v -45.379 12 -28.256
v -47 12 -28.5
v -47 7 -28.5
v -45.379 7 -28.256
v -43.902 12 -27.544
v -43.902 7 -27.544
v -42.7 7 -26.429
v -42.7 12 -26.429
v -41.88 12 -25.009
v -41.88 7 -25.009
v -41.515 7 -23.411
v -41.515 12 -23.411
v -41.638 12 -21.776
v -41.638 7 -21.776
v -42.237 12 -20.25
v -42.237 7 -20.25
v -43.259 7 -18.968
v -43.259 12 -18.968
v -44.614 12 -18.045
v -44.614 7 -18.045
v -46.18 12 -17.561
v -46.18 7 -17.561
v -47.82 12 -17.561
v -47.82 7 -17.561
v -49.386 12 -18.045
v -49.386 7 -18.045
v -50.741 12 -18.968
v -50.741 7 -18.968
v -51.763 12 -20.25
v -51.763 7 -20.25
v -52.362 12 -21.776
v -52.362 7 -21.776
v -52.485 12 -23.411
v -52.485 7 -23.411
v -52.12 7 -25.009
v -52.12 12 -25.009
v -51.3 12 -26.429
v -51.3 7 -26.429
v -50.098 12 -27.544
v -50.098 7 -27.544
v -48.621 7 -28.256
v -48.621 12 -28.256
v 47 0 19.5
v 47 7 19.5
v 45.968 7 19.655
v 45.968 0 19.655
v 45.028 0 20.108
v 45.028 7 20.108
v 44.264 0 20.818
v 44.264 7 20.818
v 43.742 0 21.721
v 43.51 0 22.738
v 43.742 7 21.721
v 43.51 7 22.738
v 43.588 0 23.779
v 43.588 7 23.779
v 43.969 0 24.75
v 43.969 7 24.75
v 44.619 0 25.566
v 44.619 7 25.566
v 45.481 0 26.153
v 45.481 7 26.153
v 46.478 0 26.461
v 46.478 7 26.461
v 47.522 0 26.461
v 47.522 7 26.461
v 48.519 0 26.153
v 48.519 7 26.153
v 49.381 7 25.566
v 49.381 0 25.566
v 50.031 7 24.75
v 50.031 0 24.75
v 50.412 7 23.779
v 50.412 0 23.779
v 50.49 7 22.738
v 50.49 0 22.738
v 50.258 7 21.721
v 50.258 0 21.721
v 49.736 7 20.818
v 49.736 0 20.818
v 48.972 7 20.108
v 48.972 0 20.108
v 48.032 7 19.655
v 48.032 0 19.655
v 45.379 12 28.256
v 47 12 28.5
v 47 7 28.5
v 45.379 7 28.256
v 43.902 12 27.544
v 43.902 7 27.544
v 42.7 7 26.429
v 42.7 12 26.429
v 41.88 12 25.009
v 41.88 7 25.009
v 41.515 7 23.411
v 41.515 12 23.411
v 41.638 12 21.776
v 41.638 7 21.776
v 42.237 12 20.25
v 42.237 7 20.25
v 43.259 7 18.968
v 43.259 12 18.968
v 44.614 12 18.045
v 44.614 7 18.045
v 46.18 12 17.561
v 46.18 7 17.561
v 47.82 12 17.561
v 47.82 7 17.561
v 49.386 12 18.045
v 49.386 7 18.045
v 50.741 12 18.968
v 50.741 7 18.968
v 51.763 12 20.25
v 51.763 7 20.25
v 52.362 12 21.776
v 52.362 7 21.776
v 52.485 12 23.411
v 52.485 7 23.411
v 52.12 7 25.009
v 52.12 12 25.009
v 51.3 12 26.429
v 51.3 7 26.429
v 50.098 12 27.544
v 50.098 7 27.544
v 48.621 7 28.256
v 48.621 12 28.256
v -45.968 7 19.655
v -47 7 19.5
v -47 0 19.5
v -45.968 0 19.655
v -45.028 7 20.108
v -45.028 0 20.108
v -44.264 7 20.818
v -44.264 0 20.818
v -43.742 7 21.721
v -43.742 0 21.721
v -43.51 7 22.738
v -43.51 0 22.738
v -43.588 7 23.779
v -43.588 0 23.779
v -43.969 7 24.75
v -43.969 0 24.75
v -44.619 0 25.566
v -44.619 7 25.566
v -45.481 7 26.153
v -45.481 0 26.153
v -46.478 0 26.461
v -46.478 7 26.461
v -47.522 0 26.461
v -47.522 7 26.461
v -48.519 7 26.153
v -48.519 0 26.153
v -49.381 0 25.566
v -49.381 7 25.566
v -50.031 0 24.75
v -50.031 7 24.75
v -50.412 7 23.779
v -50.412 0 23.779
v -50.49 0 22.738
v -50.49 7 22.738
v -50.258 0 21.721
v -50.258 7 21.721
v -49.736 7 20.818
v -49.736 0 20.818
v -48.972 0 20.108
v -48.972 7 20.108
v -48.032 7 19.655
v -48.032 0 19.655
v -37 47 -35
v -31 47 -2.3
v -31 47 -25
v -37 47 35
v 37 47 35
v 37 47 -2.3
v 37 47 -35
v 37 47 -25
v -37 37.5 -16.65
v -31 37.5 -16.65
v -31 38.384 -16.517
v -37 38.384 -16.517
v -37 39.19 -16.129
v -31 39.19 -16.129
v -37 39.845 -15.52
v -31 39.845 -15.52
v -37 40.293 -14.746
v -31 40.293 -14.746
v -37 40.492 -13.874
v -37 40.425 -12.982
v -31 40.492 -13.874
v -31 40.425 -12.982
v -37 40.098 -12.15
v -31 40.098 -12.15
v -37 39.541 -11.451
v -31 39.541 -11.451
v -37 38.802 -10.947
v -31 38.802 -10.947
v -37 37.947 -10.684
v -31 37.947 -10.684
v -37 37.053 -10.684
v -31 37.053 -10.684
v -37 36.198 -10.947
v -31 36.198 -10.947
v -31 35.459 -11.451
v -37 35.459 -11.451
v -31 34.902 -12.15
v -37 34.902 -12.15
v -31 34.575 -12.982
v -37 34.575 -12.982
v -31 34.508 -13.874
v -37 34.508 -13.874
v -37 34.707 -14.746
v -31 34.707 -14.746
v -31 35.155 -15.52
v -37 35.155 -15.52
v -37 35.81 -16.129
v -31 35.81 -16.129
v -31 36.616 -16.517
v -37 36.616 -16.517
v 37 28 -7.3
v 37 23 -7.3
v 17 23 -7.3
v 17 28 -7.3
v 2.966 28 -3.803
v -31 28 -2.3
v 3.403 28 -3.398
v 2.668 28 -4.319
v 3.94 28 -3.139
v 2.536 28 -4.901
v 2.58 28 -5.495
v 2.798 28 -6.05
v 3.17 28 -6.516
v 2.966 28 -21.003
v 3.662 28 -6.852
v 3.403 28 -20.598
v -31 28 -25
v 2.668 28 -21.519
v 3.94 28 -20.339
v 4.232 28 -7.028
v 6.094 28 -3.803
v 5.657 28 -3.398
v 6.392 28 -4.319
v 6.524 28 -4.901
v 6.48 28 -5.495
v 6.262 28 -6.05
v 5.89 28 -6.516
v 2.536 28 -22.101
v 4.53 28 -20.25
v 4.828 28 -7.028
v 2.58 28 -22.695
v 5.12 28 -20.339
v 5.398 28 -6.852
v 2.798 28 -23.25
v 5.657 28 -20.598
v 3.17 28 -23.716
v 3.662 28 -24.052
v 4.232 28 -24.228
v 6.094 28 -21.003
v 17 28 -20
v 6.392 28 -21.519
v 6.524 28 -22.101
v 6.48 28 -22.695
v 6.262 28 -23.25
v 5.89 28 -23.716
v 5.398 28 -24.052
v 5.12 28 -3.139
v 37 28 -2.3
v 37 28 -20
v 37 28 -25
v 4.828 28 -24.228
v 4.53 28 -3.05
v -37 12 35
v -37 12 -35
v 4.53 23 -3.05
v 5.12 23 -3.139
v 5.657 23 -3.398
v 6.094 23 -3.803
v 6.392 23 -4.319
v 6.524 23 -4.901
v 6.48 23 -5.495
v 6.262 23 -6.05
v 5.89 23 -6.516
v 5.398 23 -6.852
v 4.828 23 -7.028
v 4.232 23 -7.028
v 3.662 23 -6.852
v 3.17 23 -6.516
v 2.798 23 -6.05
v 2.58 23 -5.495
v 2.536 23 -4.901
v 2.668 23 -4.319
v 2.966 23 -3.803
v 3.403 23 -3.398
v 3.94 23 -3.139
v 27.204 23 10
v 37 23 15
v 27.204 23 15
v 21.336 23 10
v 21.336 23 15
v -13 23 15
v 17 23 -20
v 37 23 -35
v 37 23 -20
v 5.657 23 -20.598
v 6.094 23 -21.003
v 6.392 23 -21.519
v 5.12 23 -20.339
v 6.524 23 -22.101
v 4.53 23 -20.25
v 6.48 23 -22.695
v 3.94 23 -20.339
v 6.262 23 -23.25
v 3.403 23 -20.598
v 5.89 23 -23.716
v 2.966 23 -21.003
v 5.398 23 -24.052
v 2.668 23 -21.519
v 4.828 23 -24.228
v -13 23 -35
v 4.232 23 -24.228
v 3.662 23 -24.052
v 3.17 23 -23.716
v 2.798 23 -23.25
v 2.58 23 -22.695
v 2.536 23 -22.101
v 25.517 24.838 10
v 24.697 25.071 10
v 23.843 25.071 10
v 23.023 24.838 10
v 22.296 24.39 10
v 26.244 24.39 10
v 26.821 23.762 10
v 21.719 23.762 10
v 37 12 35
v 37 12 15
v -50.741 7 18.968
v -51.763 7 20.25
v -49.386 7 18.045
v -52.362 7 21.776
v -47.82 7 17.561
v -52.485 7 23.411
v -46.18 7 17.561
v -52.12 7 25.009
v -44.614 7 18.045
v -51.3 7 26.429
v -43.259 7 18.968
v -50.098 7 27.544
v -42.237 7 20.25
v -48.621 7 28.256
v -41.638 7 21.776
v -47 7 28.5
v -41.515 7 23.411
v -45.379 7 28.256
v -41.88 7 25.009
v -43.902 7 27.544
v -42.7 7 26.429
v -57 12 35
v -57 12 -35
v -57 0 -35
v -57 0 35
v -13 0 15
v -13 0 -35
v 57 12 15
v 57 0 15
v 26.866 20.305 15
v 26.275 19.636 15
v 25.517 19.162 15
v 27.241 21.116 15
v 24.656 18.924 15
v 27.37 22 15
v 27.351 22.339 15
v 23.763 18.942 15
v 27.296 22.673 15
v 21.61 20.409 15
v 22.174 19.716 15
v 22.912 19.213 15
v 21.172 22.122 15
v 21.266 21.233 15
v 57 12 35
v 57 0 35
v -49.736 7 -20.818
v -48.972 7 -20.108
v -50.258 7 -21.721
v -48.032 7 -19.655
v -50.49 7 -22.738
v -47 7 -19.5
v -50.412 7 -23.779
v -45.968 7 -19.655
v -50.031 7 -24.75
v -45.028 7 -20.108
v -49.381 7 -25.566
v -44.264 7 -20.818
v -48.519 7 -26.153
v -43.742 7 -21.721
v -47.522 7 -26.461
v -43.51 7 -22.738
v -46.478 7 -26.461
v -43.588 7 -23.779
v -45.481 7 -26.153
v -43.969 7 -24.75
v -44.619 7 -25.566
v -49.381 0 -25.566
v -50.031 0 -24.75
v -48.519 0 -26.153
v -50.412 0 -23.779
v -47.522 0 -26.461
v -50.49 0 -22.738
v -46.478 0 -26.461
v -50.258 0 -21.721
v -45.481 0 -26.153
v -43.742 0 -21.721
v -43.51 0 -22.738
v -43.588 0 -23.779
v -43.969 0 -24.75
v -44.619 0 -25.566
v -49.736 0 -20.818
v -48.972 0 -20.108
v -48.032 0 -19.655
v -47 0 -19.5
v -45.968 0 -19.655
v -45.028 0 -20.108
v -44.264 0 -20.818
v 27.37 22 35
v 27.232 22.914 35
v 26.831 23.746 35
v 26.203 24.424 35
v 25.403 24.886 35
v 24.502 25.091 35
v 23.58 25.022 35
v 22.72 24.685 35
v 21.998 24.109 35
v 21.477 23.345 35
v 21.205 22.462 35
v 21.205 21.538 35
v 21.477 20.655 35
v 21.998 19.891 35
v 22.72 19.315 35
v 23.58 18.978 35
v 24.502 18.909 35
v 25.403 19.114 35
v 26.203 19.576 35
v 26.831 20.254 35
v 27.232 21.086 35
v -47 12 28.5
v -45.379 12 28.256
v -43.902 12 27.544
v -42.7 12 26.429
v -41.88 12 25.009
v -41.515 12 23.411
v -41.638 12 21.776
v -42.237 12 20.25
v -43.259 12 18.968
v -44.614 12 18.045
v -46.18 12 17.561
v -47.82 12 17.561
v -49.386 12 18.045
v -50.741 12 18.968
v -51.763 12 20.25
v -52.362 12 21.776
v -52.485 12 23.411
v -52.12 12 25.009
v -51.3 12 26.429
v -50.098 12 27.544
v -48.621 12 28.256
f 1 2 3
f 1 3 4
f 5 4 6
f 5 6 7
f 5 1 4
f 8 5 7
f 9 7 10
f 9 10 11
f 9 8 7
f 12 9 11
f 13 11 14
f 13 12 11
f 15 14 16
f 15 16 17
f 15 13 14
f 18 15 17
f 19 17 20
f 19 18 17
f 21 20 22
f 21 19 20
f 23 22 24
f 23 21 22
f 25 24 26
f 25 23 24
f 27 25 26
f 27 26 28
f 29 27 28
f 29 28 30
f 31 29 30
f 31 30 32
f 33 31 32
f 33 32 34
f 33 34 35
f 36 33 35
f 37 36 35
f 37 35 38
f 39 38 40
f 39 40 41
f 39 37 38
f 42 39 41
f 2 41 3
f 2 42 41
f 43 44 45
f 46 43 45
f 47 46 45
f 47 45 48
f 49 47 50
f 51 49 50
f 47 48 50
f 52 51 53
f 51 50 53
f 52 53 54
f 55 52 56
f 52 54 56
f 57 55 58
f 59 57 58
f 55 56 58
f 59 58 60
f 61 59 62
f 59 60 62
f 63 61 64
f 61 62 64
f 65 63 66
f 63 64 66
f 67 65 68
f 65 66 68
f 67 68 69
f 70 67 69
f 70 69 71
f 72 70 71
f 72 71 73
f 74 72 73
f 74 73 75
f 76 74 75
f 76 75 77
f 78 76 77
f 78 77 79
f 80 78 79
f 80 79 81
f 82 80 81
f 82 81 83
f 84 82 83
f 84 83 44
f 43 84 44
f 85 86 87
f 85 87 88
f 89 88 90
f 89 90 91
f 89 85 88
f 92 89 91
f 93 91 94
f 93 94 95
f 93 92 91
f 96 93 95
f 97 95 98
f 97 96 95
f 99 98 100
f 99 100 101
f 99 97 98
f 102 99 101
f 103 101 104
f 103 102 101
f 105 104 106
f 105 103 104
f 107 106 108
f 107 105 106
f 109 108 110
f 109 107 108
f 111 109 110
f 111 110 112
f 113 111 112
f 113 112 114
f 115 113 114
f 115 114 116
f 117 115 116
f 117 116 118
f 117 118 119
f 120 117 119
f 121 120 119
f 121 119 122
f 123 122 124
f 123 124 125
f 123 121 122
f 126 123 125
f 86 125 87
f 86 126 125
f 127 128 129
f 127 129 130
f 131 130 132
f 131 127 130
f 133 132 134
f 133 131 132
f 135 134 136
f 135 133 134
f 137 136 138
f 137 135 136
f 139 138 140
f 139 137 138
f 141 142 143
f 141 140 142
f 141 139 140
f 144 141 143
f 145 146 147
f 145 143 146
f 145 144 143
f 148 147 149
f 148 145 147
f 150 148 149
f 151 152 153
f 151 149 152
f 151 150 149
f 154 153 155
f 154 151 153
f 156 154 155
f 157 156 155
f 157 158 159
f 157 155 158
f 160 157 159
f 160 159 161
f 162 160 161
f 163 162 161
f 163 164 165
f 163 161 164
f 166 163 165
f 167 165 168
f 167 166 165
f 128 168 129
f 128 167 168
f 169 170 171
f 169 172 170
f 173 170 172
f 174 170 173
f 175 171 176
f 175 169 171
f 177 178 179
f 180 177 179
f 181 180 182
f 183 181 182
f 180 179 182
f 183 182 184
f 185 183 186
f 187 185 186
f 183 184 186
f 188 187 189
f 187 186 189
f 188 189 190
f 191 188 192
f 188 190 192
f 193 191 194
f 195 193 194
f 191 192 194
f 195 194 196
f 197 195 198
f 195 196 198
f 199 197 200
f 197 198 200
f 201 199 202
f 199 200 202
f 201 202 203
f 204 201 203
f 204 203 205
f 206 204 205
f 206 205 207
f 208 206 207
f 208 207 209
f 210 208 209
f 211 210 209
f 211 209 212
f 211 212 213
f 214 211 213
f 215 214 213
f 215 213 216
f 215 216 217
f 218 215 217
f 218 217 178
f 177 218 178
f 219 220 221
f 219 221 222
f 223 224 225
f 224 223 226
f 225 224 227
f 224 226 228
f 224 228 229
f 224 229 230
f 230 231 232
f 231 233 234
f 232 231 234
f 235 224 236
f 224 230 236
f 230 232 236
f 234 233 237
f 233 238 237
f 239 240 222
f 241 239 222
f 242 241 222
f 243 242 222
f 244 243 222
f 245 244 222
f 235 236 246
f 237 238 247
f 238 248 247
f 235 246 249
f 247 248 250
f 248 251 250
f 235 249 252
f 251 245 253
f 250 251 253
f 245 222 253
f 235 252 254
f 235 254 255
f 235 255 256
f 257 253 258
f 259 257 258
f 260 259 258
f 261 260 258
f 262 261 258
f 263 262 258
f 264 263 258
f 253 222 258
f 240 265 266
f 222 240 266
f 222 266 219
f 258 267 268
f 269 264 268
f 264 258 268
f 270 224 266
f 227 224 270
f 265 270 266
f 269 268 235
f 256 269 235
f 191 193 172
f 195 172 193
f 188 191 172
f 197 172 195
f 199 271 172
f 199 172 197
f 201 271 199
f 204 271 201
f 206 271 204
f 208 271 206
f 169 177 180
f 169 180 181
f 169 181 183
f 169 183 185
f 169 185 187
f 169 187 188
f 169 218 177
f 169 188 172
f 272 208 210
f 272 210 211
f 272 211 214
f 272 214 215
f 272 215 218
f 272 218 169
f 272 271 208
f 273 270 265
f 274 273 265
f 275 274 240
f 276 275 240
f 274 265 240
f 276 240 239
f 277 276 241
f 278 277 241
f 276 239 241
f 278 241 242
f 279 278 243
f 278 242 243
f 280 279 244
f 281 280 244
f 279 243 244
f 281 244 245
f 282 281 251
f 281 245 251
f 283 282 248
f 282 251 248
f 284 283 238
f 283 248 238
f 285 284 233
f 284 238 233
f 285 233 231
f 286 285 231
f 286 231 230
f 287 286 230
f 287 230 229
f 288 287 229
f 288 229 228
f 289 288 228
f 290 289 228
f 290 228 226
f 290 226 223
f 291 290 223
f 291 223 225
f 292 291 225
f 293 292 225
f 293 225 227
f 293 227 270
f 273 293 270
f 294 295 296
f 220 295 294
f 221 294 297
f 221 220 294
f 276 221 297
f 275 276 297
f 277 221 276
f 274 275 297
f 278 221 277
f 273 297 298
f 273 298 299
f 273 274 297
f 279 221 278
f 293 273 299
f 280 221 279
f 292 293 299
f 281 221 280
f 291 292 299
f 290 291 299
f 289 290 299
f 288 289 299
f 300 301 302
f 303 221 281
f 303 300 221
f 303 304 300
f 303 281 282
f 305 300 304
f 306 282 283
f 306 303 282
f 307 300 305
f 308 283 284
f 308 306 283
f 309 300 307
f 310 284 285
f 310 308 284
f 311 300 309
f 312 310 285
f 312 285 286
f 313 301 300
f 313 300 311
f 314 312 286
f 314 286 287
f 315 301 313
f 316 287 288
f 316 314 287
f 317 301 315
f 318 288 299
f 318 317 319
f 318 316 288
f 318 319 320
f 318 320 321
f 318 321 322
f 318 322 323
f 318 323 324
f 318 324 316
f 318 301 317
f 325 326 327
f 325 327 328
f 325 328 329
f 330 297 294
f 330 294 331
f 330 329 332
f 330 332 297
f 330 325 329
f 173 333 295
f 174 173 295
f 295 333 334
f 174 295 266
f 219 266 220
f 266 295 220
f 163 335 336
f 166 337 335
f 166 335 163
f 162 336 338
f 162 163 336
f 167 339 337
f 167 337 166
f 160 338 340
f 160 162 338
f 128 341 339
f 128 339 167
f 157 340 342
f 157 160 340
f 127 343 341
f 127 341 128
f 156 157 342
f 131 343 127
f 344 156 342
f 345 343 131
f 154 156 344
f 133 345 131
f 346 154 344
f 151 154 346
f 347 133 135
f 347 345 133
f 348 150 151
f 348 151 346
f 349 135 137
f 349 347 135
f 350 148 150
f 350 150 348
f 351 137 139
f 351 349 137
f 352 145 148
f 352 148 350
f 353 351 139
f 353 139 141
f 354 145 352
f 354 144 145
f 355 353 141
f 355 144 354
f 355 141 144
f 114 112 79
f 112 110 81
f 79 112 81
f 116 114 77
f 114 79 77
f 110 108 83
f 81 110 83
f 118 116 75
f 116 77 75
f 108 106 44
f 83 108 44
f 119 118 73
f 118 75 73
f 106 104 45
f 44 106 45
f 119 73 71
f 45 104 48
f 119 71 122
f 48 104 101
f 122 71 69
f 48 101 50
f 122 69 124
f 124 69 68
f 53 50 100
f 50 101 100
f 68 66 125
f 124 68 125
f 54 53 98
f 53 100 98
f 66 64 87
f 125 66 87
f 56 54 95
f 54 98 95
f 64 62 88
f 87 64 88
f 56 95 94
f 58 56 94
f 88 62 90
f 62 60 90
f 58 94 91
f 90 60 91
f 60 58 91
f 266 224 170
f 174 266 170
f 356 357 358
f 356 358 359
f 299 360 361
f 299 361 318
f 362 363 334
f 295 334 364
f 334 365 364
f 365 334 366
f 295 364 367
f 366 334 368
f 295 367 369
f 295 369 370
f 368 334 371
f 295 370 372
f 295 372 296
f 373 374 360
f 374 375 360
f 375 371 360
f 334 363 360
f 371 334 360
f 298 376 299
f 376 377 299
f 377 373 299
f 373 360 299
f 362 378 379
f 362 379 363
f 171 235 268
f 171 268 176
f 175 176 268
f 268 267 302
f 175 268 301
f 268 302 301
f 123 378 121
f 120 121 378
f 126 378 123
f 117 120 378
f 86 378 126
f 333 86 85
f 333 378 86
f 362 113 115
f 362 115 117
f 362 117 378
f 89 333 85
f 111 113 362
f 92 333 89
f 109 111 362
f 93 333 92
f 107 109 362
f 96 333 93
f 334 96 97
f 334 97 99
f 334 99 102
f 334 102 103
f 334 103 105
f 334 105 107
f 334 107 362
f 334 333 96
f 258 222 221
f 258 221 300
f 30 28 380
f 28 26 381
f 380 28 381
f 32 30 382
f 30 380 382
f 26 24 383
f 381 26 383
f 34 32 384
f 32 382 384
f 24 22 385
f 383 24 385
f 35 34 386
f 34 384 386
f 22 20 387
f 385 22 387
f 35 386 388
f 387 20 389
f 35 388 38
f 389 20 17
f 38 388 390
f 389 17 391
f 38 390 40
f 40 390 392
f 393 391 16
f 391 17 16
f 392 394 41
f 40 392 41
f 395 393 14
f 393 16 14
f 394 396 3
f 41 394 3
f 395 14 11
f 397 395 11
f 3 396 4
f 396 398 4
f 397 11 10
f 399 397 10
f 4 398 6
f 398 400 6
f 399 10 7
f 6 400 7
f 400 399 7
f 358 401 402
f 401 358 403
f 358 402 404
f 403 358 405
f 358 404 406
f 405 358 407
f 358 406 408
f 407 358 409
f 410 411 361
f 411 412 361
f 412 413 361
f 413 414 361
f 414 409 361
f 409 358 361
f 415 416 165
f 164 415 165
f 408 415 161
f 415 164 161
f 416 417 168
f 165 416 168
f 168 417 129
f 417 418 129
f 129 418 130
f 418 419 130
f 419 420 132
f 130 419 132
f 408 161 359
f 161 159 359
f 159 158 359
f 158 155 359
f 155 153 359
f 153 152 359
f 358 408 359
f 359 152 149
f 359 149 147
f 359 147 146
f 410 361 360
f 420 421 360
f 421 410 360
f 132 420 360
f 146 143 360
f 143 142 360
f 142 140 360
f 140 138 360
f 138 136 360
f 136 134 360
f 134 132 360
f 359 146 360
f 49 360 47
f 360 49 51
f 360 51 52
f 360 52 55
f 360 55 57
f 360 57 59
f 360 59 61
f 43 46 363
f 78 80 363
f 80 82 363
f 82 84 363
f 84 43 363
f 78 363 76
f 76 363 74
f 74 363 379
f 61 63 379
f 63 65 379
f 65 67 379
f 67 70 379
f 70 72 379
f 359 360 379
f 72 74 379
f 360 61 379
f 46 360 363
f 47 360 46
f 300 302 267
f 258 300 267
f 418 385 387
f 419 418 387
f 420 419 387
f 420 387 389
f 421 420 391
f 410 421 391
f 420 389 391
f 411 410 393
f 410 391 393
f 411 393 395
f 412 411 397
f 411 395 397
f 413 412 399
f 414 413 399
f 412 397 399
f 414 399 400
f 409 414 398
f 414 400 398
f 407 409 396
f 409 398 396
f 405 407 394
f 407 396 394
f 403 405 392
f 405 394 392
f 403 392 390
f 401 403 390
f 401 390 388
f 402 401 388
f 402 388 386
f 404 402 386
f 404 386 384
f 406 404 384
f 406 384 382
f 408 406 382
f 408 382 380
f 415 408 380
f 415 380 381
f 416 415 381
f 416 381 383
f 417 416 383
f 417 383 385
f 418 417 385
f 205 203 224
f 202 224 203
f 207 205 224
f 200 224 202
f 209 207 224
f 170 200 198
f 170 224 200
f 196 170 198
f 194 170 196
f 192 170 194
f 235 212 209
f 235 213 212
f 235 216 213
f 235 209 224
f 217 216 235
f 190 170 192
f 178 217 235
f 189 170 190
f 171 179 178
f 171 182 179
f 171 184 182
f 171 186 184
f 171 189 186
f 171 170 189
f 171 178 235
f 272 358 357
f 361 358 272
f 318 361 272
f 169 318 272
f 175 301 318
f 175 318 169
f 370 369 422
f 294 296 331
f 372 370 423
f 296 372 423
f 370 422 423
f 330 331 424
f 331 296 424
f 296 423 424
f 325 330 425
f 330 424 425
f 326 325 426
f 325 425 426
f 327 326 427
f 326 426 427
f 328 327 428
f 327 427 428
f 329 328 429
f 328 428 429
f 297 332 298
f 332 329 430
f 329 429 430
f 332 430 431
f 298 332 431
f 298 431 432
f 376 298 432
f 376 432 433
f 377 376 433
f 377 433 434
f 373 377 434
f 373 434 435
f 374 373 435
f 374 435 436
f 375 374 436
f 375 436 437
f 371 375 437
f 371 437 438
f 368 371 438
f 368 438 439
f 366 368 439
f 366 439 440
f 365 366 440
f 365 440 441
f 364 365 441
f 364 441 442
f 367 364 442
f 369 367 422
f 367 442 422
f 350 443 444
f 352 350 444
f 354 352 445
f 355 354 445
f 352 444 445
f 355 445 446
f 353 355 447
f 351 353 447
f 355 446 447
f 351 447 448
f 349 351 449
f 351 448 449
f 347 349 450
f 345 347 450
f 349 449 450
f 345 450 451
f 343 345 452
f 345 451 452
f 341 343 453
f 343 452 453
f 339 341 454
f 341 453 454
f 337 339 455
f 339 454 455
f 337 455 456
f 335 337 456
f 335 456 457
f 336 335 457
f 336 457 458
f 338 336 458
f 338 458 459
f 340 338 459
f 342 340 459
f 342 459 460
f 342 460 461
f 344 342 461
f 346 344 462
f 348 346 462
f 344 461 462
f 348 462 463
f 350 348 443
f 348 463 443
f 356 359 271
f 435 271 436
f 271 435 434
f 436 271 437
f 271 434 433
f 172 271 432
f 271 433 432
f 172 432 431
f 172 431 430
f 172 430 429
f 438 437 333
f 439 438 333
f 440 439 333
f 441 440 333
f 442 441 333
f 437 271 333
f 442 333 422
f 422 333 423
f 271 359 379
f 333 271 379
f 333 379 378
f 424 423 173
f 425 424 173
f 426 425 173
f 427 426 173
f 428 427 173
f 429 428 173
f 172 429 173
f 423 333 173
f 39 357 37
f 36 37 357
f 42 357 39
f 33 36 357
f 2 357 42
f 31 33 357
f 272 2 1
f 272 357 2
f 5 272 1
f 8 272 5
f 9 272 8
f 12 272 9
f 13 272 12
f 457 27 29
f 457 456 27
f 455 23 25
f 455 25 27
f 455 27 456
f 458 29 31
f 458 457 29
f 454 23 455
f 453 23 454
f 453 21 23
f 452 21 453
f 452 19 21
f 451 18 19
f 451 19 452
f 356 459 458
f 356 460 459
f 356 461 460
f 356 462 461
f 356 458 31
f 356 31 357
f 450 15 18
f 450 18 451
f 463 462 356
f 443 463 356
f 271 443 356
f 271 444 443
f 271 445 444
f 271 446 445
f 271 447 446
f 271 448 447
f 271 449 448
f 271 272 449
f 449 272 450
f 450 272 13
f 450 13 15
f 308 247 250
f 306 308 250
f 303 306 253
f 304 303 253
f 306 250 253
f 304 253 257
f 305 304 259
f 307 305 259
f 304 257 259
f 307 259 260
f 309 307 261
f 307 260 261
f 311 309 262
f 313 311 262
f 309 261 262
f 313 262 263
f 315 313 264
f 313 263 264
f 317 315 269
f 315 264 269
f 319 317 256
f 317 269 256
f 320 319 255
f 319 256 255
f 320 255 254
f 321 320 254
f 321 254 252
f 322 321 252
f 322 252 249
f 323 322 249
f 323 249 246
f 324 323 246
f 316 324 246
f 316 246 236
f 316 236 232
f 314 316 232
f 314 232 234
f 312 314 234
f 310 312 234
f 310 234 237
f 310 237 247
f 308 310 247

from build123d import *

# Parameters (mm, degrees)
SKETCH1_W                                  = 74
SKETCH1_H                                  = 70
BOSS_EXTRUDE1_DEPTH                        = 47
SKETCH2_W                                  = 22.7
SKETCH2_H                                  = 19
CUT_EXTRUDE1_DEPTH                         = 68
SKETCH7_W                                  = 50
SKETCH7_H                                  = 23
CUT_EXTRUDE4_DEPTH                         = 50
SKETCH8_R                                  = 3.1
CUT_EXTRUDE5_DEPTH                         = 25
SKETCH9_W                                  = 20
SKETCH9_H                                  = 12
BOSS_EXTRUDE3_DEPTH                        = 20
SKETCH10_W                                 = 70
SKETCH10_H                                 = 12
BOSS_EXTRUDE4_DEPTH                        = 20
SKETCH12_R                                 = 3.5
CUT_EXTRUDE6_DEPTH                         = 20
MIRROR1_AT_THE_SECOND_PLANE_COPY_1_SKETC_R = 3.5
MIRROR1_AT_THE_SECOND_PLANE_COPY_1_DEPTH   = 20
SKETCH13_R                                 = 5.5
CUT_EXTRUDE7_DEPTH                         = 5
SKETCH14_R                                 = 3
CUT_EXTRUDE8_DEPTH                         = 10
SKETCH15_W                                 = 12.7
SKETCH15_H                                 = 5
CUT_EXTRUDE9_DEPTH                         = 20
SKETCH16_R                                 = 2
CUT_EXTRUDE10_DEPTH                        = 73.512067961


with BuildPart() as part:
    # Sketch1 → Boss-Extrude1 (new body)
    with BuildSketch(Plane(origin=(0, 0, 0), x_dir=(1, 0, 0), z_dir=(0, 1, 0))):
        Rectangle(SKETCH1_W, SKETCH1_H)
    extrude(amount=BOSS_EXTRUDE1_DEPTH)

    # Sketch2 → Cut-Extrude1 (cut)
    with BuildSketch(Plane(origin=(37, 0, 0), x_dir=(0, 0, -1), z_dir=(1, 0, 0))):
        with Locations((13.65, 37.5)):
            Rectangle(SKETCH2_W, SKETCH2_H)
    extrude(amount=-CUT_EXTRUDE1_DEPTH, mode=Mode.SUBTRACT)

    # Sketch7 → Cut-Extrude4 (cut)
    with BuildSketch(Plane(origin=(0, 0, -35), x_dir=(-1, 0, 0), z_dir=(0, 0, -1))):
        with Locations((-12, 11.5)):
            Rectangle(SKETCH7_W, SKETCH7_H)
    extrude(amount=-CUT_EXTRUDE4_DEPTH, mode=Mode.SUBTRACT)

    # Sketch8 → Cut-Extrude5 (cut)
    with BuildSketch(Plane.XY.offset(35)):
        with Locations((24.27, 22)):
            Circle(SKETCH8_R)
    extrude(amount=-CUT_EXTRUDE5_DEPTH, mode=Mode.SUBTRACT)

    # Sketch9 → Boss-Extrude3 (add)
    with BuildSketch(Plane(origin=(37, 0, 0), x_dir=(0, 0, -1), z_dir=(1, 0, 0))):
        with Locations((-25, 6)):
            Rectangle(SKETCH9_W, SKETCH9_H)
    extrude(amount=BOSS_EXTRUDE3_DEPTH)

    # Sketch10 → Boss-Extrude4 (add)
    with BuildSketch(Plane.ZY.offset(37)):
        with Locations((0, 6)):
            Rectangle(SKETCH10_W, SKETCH10_H)
    extrude(amount=BOSS_EXTRUDE4_DEPTH)

    # Sketch12 → Cut-Extrude6 (cut)
    with BuildSketch(Plane(origin=(0, 12, 0), x_dir=(1, 0, 0), z_dir=(0, 1, 0))):
        with Locations(Location((-47, 23, 0), (0, 0, 270))):
            Circle(SKETCH12_R)
    cut_extrude6 = extrude(amount=-CUT_EXTRUDE6_DEPTH, mode=Mode.SUBTRACT)

    # Mirror1: Cut-Extrude6 across plane
    add(cut_extrude6.mirror(Plane.XY), mode=Mode.SUBTRACT)

    # Mirror1 at the second plane: Cut-Extrude6 across plane
    add(cut_extrude6.mirror(Plane(origin=(0, 0, 0), x_dir=(0, 0, 1), z_dir=(1, 0, 0))), mode=Mode.SUBTRACT)

    # Mirror1 at the second plane copy 1 sketc → Mirror1 at the second plane copy 1 (cut)
    with BuildSketch(Plane(origin=(0, 12, 0), x_dir=(-1, 0, 0), z_dir=(0, 1, 0))):
        with Locations(Location((-47, 23, 0), (0, 0, 270))):
            Circle(MIRROR1_AT_THE_SECOND_PLANE_COPY_1_SKETC_R)
    extrude(amount=-MIRROR1_AT_THE_SECOND_PLANE_COPY_1_DEPTH, mode=Mode.SUBTRACT)

    # Sketch13 → Cut-Extrude7 (cut)
    with BuildSketch(Plane(origin=(0, 12, 0), x_dir=(1, 0, 0), z_dir=(0, 1, 0))):
        with Locations(Location((-47, -23, 0), (0, 0, 270))):
            Circle(SKETCH13_R)
    cut_extrude7 = extrude(amount=-CUT_EXTRUDE7_DEPTH, mode=Mode.SUBTRACT)

    # Mirror2: Cut-Extrude7 across plane
    add(cut_extrude7.mirror(Plane.XY), mode=Mode.SUBTRACT)

    # Mirror2 at the second plane: Cut-Extrude7 across plane
    add(cut_extrude7.mirror(Plane(origin=(0, 0, 0), x_dir=(0, 0, 1), z_dir=(1, 0, 0))), mode=Mode.SUBTRACT)

    # Sketch14 → Cut-Extrude8 (cut)
    with BuildSketch(Plane(origin=(-31, 0, 0), x_dir=(0, 0, -1), z_dir=(1, 0, 0))):
        with Locations((13.65, 37.5)):
            Circle(SKETCH14_R)
    extrude(amount=-CUT_EXTRUDE8_DEPTH, mode=Mode.SUBTRACT)

    # Sketch15 → Cut-Extrude9 (cut)
    with BuildSketch(Plane(origin=(37, 0, 0), x_dir=(0, 0, -1), z_dir=(1, 0, 0))):
        with Locations((13.65, 25.5)):
            Rectangle(SKETCH15_W, SKETCH15_H)
    extrude(amount=-CUT_EXTRUDE9_DEPTH, mode=Mode.SUBTRACT)

    # Sketch16 → Cut-Extrude10 (cut, through all)
    with BuildSketch(Plane(origin=(0, 28, 0), x_dir=(1, 0, 0), z_dir=(0, 1, 0))):
        with Locations(Location((4.53, 5.05, 0), (0, 0, 270))):
            Circle(SKETCH16_R)
        with Locations(Location((4.53, 22.25, 0), (0, 0, 270))):
            Circle(SKETCH16_R)
    extrude(amount=-CUT_EXTRUDE10_DEPTH, mode=Mode.SUBTRACT)


solid = part.part
